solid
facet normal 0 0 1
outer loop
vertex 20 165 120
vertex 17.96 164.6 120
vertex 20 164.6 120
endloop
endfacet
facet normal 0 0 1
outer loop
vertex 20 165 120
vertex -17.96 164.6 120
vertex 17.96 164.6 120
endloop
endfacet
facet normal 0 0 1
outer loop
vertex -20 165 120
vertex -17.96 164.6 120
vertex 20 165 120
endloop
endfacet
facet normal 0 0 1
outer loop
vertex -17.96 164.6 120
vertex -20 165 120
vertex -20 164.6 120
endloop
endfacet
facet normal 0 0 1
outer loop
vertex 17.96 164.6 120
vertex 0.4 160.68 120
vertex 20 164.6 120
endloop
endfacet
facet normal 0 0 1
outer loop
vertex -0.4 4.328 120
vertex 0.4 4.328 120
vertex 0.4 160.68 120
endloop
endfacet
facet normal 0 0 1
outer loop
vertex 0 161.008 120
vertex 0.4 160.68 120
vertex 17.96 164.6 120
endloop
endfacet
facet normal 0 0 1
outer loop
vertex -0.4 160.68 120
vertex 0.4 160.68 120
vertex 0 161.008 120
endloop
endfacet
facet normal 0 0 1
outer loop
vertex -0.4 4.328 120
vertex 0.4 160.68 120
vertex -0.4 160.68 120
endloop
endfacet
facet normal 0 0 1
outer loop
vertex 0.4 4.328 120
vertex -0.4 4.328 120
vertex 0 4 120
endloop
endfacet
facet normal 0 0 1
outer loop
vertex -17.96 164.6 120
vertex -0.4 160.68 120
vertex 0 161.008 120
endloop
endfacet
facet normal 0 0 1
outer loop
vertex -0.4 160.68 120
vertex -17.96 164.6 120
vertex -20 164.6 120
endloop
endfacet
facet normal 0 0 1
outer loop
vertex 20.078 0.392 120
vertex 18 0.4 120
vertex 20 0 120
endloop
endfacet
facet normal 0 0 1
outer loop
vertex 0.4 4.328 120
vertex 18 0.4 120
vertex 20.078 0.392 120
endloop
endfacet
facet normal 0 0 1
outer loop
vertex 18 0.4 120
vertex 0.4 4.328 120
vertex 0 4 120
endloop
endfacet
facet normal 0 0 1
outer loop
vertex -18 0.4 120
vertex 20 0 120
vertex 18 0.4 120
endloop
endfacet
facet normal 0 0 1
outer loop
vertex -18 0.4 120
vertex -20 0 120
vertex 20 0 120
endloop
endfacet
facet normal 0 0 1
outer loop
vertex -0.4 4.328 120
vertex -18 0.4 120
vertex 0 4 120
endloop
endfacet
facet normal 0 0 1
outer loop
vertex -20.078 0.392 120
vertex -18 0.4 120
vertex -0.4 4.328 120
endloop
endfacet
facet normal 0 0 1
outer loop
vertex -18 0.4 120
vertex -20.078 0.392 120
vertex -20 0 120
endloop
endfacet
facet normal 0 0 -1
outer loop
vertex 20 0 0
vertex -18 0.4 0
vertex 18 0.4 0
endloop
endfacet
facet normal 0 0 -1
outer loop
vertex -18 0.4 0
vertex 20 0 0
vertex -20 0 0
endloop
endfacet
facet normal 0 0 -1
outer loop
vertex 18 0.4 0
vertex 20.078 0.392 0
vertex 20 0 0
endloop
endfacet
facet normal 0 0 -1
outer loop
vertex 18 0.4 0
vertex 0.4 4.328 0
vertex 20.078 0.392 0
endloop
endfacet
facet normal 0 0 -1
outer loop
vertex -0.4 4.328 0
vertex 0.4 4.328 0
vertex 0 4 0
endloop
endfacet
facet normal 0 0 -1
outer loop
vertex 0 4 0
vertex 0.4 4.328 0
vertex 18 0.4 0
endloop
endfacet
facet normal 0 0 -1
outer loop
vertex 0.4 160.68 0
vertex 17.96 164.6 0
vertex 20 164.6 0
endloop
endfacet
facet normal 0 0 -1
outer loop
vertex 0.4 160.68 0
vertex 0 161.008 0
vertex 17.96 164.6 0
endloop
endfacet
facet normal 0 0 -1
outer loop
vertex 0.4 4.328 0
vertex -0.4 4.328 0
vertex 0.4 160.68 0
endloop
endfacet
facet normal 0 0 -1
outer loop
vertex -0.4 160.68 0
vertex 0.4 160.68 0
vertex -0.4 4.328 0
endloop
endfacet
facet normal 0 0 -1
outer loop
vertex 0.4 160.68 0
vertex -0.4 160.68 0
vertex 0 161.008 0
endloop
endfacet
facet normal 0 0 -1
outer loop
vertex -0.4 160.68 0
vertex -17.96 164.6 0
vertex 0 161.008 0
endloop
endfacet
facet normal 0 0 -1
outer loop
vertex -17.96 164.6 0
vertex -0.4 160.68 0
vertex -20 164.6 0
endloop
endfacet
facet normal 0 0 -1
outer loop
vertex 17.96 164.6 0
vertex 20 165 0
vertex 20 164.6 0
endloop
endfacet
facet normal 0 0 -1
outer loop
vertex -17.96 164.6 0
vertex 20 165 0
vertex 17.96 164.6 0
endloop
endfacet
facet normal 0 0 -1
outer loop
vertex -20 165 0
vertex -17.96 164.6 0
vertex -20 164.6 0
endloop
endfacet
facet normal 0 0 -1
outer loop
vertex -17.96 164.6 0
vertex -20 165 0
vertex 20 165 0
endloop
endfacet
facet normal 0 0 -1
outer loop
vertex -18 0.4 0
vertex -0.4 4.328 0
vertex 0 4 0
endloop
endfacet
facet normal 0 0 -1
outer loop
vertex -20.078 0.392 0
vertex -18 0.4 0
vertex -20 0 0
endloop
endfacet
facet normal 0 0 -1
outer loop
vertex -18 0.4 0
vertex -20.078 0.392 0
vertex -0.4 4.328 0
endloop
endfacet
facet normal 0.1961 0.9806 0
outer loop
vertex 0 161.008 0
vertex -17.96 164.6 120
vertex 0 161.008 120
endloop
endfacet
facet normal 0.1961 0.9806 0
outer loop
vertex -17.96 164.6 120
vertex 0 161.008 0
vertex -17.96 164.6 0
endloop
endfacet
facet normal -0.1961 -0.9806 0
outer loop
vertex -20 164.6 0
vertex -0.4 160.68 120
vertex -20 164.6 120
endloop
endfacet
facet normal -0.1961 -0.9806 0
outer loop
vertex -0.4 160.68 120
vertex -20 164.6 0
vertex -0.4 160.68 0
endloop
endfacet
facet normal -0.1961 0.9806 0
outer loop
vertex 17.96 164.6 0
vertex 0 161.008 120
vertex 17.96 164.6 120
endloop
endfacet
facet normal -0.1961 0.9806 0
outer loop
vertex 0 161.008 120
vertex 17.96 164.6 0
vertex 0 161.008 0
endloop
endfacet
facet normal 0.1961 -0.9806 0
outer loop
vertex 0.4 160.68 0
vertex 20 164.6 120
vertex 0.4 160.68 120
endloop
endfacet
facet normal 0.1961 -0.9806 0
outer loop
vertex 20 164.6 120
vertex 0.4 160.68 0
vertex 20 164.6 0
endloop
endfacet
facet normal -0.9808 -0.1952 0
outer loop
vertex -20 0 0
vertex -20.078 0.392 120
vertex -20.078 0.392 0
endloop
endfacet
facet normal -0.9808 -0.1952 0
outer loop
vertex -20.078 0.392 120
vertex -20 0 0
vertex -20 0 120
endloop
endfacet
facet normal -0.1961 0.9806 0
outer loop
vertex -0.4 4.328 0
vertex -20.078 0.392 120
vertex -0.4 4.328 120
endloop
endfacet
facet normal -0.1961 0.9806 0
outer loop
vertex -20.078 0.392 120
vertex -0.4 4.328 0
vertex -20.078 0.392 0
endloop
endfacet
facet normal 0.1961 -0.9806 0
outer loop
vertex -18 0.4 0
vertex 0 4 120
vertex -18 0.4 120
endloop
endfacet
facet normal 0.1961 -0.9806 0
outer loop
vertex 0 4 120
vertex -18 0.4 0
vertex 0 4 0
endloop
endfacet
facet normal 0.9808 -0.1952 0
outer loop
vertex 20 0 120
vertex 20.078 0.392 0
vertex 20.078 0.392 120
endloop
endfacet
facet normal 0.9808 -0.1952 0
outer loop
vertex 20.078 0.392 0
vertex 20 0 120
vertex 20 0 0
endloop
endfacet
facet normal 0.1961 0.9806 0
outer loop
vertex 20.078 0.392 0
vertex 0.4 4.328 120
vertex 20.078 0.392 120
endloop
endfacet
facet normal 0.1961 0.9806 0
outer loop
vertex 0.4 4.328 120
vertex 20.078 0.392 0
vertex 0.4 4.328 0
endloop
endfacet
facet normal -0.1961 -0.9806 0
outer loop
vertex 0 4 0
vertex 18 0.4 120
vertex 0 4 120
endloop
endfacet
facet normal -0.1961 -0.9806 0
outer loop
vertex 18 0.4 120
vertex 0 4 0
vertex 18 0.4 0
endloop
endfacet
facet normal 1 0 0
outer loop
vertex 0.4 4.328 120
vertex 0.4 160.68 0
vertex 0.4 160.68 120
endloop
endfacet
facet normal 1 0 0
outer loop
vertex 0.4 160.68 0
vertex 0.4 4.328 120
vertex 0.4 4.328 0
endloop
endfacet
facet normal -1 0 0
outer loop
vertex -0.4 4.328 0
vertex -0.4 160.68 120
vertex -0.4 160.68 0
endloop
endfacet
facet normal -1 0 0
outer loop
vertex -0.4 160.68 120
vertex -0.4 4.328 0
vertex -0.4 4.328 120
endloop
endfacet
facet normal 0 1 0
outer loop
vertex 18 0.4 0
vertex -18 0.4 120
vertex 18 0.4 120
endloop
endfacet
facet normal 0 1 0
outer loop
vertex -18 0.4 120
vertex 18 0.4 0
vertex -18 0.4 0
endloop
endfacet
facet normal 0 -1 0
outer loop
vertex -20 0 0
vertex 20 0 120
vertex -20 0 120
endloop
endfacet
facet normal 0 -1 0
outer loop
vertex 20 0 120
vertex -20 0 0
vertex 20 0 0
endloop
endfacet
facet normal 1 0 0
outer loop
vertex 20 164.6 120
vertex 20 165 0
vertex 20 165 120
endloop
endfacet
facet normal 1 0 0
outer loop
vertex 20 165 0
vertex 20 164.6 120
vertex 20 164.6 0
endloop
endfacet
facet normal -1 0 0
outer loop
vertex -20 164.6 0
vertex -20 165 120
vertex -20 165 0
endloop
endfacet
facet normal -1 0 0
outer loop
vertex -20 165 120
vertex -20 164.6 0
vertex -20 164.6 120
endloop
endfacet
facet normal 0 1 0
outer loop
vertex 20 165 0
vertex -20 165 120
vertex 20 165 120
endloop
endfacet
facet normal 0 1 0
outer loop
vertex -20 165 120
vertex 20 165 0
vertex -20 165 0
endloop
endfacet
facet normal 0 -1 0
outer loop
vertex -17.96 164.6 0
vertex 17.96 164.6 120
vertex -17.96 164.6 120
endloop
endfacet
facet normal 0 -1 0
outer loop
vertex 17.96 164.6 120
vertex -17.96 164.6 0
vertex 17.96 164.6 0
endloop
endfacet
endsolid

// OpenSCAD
height = 120;
width = 165;
depth = 40;
half_depth = depth / 2;
nozzle_diameter = 0.4;
base = 0.2;
triangle_height = 4;

translate([-nozzle_diameter, triangle_height, 0]) {
  cube([nozzle_diameter * 2, width - (2 * triangle_height), height]);
}
translate([-depth / 2, 0, 0]) {
  cube([depth, nozzle_diameter, height]);
}
translate([-depth / 2, width - nozzle_diameter, 0]) {
  cube([depth, nozzle_diameter, height]);
}

translate([-depth / 2, width - nozzle_diameter, 0]) {
  c = sqrt((half_depth * half_depth) + (triangle_height * triangle_height));
  a = asin(triangle_height / c);
  rotate(a, [0, 0, -1]) {
    cube([c, nozzle_diameter, height]);
  }
  translate([half_depth, -triangle_height, 0]) {
    rotate(a, [0, 0, 1]) {
      cube([c, nozzle_diameter, height]);
    }
  }
  translate([0, -width + nozzle_diameter, 0]) {
    rotate(a, [0, 0, 1]) {
      cube([c, nozzle_diameter, height]);
    }
  }
  translate([0, -width + nozzle_diameter, 0]) {
    rotate(a, [0, 0, 1]) {
      cube([c, nozzle_diameter, height]);
    }
  }
  translate([half_depth, -width + nozzle_diameter + triangle_height, 0]) {
    rotate(a, [0, 0, -1]) {
      cube([c, nozzle_diameter, height]);
    }
  }
}
